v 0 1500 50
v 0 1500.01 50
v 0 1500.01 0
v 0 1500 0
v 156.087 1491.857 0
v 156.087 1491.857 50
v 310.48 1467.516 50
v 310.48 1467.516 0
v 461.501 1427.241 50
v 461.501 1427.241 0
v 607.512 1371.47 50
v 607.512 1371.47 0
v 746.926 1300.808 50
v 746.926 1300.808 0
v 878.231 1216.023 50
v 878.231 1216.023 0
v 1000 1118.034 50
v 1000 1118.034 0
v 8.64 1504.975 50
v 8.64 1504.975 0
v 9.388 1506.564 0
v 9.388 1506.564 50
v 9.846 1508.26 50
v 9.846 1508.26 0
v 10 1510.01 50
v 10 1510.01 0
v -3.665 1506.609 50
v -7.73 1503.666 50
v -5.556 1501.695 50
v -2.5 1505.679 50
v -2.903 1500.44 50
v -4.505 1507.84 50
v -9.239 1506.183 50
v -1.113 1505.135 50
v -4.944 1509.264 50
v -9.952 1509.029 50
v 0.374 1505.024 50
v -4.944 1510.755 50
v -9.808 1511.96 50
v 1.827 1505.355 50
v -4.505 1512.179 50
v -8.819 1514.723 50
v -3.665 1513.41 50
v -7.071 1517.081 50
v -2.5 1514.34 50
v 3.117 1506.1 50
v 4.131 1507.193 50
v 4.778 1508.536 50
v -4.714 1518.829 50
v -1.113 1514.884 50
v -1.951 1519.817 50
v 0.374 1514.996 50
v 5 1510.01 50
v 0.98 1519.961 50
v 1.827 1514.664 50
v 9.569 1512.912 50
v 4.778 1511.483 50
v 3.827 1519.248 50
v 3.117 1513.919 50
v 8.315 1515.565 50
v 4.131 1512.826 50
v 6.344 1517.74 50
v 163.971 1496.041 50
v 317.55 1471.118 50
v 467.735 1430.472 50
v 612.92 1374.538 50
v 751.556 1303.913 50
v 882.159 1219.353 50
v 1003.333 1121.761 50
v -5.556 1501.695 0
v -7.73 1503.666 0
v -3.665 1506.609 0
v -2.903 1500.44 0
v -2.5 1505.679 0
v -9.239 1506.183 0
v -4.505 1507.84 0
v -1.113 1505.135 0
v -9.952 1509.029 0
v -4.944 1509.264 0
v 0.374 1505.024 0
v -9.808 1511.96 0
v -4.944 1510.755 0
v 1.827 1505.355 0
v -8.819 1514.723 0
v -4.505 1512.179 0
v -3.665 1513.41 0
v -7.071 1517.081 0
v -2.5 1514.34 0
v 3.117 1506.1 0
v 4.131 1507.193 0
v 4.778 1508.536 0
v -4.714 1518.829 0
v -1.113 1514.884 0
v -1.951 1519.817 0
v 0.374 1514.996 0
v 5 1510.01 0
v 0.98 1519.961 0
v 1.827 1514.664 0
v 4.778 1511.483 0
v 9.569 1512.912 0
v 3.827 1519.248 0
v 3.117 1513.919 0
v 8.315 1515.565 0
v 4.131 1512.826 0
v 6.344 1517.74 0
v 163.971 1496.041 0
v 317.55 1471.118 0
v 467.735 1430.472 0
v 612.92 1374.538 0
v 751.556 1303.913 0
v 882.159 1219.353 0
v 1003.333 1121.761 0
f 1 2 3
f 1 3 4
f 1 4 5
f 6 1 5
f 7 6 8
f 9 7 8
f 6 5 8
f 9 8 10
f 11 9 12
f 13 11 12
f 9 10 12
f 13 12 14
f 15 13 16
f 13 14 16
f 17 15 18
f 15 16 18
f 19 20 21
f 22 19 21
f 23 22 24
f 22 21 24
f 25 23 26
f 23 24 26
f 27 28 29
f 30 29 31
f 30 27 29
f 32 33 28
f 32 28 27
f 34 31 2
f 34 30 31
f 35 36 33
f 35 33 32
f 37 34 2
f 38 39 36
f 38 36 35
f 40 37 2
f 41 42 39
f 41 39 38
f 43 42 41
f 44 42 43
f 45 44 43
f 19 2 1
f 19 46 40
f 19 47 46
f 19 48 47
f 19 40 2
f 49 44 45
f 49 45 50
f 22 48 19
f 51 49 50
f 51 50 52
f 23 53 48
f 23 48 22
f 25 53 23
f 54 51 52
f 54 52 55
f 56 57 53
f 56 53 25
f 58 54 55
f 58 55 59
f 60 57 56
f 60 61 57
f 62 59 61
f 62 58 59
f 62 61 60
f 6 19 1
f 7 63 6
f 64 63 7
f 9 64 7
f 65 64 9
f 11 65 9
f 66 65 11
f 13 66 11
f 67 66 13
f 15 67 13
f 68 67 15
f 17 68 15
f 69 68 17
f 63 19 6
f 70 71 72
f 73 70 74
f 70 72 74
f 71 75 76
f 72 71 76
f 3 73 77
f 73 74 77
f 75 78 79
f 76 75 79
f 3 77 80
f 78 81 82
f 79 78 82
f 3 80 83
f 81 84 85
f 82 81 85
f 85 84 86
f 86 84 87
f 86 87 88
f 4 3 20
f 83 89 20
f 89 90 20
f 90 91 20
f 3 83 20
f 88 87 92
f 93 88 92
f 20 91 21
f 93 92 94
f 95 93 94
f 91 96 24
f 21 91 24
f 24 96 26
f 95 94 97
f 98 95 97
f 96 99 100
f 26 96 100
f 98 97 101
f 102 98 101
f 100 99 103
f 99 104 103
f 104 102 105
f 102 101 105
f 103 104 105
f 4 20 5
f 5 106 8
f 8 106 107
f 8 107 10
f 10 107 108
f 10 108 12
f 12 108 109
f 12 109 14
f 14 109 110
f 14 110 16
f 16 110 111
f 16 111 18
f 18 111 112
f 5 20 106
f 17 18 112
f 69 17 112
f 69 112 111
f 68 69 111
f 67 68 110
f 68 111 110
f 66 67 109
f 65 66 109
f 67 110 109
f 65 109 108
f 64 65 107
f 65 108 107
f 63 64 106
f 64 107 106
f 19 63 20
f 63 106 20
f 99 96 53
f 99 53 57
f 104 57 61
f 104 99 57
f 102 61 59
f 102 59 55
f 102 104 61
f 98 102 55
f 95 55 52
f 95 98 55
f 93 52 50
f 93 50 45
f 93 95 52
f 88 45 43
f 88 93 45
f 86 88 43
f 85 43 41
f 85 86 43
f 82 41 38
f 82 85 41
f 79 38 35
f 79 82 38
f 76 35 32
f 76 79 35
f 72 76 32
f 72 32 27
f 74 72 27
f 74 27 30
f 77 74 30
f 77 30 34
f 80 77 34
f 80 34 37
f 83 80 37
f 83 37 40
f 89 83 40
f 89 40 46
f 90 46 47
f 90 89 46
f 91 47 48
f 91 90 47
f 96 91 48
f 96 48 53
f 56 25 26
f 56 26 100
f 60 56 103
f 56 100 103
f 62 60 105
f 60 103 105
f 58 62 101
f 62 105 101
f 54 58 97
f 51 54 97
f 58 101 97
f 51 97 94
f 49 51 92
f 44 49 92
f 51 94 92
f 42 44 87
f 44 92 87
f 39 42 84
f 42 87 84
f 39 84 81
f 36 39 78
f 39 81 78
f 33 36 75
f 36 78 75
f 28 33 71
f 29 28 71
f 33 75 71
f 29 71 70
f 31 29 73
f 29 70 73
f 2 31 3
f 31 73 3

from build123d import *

# Parameters (mm, degrees)
F0_R     = 5
F1_DEPTH = 50


with BuildPart() as f1:
    # F0 (on Top) → F1 (new body)
    with BuildSketch(Plane.XY):
        with BuildLine():
            Line((0, 1505.000002), (0, 1500.009527))
            ThreePointArc((0, 1500.009527), (4.982806, 1501.339369), (8.640344, 1504.975199))
            ThreePointArc((8.640344, 1504.975199), (4.32019, 1504.993801), (0, 1505.000002))
        make_face()
        with BuildLine():
            ThreePointArc((10, 1510.009527), (-7.071068, 1517.080595), (0, 1500.009527))
            Line((0, 1500.009527), (0, 1505.000002))
            ThreePointArc((0, 1505.000002), (4.32019, 1504.993801), (8.640344, 1504.975199))
            ThreePointArc((8.640344, 1504.975199), (9.654104, 1507.402176), (10, 1510.009527))
        make_face()
        with Locations((0, 1510.009527)):
            Circle(F0_R, mode=Mode.SUBTRACT)
        with BuildLine():
            ThreePointArc((0, 1500), (535.233135, 1401.258538), (1000, 1118.033989))
            Line((1000, 1118.033989), (1003.333335, 1121.76077))
            ThreePointArc((1003.333335, 1121.76077), (541.050835, 1404.38207), (8.640344, 1504.975199))
            ThreePointArc((8.640344, 1504.975199), (4.982806, 1501.339369), (0, 1500.009527))
            Line((0, 1500.009527), (0, 1500))
        make_face()
    extrude(amount=F1_DEPTH)


solid = f1.part
